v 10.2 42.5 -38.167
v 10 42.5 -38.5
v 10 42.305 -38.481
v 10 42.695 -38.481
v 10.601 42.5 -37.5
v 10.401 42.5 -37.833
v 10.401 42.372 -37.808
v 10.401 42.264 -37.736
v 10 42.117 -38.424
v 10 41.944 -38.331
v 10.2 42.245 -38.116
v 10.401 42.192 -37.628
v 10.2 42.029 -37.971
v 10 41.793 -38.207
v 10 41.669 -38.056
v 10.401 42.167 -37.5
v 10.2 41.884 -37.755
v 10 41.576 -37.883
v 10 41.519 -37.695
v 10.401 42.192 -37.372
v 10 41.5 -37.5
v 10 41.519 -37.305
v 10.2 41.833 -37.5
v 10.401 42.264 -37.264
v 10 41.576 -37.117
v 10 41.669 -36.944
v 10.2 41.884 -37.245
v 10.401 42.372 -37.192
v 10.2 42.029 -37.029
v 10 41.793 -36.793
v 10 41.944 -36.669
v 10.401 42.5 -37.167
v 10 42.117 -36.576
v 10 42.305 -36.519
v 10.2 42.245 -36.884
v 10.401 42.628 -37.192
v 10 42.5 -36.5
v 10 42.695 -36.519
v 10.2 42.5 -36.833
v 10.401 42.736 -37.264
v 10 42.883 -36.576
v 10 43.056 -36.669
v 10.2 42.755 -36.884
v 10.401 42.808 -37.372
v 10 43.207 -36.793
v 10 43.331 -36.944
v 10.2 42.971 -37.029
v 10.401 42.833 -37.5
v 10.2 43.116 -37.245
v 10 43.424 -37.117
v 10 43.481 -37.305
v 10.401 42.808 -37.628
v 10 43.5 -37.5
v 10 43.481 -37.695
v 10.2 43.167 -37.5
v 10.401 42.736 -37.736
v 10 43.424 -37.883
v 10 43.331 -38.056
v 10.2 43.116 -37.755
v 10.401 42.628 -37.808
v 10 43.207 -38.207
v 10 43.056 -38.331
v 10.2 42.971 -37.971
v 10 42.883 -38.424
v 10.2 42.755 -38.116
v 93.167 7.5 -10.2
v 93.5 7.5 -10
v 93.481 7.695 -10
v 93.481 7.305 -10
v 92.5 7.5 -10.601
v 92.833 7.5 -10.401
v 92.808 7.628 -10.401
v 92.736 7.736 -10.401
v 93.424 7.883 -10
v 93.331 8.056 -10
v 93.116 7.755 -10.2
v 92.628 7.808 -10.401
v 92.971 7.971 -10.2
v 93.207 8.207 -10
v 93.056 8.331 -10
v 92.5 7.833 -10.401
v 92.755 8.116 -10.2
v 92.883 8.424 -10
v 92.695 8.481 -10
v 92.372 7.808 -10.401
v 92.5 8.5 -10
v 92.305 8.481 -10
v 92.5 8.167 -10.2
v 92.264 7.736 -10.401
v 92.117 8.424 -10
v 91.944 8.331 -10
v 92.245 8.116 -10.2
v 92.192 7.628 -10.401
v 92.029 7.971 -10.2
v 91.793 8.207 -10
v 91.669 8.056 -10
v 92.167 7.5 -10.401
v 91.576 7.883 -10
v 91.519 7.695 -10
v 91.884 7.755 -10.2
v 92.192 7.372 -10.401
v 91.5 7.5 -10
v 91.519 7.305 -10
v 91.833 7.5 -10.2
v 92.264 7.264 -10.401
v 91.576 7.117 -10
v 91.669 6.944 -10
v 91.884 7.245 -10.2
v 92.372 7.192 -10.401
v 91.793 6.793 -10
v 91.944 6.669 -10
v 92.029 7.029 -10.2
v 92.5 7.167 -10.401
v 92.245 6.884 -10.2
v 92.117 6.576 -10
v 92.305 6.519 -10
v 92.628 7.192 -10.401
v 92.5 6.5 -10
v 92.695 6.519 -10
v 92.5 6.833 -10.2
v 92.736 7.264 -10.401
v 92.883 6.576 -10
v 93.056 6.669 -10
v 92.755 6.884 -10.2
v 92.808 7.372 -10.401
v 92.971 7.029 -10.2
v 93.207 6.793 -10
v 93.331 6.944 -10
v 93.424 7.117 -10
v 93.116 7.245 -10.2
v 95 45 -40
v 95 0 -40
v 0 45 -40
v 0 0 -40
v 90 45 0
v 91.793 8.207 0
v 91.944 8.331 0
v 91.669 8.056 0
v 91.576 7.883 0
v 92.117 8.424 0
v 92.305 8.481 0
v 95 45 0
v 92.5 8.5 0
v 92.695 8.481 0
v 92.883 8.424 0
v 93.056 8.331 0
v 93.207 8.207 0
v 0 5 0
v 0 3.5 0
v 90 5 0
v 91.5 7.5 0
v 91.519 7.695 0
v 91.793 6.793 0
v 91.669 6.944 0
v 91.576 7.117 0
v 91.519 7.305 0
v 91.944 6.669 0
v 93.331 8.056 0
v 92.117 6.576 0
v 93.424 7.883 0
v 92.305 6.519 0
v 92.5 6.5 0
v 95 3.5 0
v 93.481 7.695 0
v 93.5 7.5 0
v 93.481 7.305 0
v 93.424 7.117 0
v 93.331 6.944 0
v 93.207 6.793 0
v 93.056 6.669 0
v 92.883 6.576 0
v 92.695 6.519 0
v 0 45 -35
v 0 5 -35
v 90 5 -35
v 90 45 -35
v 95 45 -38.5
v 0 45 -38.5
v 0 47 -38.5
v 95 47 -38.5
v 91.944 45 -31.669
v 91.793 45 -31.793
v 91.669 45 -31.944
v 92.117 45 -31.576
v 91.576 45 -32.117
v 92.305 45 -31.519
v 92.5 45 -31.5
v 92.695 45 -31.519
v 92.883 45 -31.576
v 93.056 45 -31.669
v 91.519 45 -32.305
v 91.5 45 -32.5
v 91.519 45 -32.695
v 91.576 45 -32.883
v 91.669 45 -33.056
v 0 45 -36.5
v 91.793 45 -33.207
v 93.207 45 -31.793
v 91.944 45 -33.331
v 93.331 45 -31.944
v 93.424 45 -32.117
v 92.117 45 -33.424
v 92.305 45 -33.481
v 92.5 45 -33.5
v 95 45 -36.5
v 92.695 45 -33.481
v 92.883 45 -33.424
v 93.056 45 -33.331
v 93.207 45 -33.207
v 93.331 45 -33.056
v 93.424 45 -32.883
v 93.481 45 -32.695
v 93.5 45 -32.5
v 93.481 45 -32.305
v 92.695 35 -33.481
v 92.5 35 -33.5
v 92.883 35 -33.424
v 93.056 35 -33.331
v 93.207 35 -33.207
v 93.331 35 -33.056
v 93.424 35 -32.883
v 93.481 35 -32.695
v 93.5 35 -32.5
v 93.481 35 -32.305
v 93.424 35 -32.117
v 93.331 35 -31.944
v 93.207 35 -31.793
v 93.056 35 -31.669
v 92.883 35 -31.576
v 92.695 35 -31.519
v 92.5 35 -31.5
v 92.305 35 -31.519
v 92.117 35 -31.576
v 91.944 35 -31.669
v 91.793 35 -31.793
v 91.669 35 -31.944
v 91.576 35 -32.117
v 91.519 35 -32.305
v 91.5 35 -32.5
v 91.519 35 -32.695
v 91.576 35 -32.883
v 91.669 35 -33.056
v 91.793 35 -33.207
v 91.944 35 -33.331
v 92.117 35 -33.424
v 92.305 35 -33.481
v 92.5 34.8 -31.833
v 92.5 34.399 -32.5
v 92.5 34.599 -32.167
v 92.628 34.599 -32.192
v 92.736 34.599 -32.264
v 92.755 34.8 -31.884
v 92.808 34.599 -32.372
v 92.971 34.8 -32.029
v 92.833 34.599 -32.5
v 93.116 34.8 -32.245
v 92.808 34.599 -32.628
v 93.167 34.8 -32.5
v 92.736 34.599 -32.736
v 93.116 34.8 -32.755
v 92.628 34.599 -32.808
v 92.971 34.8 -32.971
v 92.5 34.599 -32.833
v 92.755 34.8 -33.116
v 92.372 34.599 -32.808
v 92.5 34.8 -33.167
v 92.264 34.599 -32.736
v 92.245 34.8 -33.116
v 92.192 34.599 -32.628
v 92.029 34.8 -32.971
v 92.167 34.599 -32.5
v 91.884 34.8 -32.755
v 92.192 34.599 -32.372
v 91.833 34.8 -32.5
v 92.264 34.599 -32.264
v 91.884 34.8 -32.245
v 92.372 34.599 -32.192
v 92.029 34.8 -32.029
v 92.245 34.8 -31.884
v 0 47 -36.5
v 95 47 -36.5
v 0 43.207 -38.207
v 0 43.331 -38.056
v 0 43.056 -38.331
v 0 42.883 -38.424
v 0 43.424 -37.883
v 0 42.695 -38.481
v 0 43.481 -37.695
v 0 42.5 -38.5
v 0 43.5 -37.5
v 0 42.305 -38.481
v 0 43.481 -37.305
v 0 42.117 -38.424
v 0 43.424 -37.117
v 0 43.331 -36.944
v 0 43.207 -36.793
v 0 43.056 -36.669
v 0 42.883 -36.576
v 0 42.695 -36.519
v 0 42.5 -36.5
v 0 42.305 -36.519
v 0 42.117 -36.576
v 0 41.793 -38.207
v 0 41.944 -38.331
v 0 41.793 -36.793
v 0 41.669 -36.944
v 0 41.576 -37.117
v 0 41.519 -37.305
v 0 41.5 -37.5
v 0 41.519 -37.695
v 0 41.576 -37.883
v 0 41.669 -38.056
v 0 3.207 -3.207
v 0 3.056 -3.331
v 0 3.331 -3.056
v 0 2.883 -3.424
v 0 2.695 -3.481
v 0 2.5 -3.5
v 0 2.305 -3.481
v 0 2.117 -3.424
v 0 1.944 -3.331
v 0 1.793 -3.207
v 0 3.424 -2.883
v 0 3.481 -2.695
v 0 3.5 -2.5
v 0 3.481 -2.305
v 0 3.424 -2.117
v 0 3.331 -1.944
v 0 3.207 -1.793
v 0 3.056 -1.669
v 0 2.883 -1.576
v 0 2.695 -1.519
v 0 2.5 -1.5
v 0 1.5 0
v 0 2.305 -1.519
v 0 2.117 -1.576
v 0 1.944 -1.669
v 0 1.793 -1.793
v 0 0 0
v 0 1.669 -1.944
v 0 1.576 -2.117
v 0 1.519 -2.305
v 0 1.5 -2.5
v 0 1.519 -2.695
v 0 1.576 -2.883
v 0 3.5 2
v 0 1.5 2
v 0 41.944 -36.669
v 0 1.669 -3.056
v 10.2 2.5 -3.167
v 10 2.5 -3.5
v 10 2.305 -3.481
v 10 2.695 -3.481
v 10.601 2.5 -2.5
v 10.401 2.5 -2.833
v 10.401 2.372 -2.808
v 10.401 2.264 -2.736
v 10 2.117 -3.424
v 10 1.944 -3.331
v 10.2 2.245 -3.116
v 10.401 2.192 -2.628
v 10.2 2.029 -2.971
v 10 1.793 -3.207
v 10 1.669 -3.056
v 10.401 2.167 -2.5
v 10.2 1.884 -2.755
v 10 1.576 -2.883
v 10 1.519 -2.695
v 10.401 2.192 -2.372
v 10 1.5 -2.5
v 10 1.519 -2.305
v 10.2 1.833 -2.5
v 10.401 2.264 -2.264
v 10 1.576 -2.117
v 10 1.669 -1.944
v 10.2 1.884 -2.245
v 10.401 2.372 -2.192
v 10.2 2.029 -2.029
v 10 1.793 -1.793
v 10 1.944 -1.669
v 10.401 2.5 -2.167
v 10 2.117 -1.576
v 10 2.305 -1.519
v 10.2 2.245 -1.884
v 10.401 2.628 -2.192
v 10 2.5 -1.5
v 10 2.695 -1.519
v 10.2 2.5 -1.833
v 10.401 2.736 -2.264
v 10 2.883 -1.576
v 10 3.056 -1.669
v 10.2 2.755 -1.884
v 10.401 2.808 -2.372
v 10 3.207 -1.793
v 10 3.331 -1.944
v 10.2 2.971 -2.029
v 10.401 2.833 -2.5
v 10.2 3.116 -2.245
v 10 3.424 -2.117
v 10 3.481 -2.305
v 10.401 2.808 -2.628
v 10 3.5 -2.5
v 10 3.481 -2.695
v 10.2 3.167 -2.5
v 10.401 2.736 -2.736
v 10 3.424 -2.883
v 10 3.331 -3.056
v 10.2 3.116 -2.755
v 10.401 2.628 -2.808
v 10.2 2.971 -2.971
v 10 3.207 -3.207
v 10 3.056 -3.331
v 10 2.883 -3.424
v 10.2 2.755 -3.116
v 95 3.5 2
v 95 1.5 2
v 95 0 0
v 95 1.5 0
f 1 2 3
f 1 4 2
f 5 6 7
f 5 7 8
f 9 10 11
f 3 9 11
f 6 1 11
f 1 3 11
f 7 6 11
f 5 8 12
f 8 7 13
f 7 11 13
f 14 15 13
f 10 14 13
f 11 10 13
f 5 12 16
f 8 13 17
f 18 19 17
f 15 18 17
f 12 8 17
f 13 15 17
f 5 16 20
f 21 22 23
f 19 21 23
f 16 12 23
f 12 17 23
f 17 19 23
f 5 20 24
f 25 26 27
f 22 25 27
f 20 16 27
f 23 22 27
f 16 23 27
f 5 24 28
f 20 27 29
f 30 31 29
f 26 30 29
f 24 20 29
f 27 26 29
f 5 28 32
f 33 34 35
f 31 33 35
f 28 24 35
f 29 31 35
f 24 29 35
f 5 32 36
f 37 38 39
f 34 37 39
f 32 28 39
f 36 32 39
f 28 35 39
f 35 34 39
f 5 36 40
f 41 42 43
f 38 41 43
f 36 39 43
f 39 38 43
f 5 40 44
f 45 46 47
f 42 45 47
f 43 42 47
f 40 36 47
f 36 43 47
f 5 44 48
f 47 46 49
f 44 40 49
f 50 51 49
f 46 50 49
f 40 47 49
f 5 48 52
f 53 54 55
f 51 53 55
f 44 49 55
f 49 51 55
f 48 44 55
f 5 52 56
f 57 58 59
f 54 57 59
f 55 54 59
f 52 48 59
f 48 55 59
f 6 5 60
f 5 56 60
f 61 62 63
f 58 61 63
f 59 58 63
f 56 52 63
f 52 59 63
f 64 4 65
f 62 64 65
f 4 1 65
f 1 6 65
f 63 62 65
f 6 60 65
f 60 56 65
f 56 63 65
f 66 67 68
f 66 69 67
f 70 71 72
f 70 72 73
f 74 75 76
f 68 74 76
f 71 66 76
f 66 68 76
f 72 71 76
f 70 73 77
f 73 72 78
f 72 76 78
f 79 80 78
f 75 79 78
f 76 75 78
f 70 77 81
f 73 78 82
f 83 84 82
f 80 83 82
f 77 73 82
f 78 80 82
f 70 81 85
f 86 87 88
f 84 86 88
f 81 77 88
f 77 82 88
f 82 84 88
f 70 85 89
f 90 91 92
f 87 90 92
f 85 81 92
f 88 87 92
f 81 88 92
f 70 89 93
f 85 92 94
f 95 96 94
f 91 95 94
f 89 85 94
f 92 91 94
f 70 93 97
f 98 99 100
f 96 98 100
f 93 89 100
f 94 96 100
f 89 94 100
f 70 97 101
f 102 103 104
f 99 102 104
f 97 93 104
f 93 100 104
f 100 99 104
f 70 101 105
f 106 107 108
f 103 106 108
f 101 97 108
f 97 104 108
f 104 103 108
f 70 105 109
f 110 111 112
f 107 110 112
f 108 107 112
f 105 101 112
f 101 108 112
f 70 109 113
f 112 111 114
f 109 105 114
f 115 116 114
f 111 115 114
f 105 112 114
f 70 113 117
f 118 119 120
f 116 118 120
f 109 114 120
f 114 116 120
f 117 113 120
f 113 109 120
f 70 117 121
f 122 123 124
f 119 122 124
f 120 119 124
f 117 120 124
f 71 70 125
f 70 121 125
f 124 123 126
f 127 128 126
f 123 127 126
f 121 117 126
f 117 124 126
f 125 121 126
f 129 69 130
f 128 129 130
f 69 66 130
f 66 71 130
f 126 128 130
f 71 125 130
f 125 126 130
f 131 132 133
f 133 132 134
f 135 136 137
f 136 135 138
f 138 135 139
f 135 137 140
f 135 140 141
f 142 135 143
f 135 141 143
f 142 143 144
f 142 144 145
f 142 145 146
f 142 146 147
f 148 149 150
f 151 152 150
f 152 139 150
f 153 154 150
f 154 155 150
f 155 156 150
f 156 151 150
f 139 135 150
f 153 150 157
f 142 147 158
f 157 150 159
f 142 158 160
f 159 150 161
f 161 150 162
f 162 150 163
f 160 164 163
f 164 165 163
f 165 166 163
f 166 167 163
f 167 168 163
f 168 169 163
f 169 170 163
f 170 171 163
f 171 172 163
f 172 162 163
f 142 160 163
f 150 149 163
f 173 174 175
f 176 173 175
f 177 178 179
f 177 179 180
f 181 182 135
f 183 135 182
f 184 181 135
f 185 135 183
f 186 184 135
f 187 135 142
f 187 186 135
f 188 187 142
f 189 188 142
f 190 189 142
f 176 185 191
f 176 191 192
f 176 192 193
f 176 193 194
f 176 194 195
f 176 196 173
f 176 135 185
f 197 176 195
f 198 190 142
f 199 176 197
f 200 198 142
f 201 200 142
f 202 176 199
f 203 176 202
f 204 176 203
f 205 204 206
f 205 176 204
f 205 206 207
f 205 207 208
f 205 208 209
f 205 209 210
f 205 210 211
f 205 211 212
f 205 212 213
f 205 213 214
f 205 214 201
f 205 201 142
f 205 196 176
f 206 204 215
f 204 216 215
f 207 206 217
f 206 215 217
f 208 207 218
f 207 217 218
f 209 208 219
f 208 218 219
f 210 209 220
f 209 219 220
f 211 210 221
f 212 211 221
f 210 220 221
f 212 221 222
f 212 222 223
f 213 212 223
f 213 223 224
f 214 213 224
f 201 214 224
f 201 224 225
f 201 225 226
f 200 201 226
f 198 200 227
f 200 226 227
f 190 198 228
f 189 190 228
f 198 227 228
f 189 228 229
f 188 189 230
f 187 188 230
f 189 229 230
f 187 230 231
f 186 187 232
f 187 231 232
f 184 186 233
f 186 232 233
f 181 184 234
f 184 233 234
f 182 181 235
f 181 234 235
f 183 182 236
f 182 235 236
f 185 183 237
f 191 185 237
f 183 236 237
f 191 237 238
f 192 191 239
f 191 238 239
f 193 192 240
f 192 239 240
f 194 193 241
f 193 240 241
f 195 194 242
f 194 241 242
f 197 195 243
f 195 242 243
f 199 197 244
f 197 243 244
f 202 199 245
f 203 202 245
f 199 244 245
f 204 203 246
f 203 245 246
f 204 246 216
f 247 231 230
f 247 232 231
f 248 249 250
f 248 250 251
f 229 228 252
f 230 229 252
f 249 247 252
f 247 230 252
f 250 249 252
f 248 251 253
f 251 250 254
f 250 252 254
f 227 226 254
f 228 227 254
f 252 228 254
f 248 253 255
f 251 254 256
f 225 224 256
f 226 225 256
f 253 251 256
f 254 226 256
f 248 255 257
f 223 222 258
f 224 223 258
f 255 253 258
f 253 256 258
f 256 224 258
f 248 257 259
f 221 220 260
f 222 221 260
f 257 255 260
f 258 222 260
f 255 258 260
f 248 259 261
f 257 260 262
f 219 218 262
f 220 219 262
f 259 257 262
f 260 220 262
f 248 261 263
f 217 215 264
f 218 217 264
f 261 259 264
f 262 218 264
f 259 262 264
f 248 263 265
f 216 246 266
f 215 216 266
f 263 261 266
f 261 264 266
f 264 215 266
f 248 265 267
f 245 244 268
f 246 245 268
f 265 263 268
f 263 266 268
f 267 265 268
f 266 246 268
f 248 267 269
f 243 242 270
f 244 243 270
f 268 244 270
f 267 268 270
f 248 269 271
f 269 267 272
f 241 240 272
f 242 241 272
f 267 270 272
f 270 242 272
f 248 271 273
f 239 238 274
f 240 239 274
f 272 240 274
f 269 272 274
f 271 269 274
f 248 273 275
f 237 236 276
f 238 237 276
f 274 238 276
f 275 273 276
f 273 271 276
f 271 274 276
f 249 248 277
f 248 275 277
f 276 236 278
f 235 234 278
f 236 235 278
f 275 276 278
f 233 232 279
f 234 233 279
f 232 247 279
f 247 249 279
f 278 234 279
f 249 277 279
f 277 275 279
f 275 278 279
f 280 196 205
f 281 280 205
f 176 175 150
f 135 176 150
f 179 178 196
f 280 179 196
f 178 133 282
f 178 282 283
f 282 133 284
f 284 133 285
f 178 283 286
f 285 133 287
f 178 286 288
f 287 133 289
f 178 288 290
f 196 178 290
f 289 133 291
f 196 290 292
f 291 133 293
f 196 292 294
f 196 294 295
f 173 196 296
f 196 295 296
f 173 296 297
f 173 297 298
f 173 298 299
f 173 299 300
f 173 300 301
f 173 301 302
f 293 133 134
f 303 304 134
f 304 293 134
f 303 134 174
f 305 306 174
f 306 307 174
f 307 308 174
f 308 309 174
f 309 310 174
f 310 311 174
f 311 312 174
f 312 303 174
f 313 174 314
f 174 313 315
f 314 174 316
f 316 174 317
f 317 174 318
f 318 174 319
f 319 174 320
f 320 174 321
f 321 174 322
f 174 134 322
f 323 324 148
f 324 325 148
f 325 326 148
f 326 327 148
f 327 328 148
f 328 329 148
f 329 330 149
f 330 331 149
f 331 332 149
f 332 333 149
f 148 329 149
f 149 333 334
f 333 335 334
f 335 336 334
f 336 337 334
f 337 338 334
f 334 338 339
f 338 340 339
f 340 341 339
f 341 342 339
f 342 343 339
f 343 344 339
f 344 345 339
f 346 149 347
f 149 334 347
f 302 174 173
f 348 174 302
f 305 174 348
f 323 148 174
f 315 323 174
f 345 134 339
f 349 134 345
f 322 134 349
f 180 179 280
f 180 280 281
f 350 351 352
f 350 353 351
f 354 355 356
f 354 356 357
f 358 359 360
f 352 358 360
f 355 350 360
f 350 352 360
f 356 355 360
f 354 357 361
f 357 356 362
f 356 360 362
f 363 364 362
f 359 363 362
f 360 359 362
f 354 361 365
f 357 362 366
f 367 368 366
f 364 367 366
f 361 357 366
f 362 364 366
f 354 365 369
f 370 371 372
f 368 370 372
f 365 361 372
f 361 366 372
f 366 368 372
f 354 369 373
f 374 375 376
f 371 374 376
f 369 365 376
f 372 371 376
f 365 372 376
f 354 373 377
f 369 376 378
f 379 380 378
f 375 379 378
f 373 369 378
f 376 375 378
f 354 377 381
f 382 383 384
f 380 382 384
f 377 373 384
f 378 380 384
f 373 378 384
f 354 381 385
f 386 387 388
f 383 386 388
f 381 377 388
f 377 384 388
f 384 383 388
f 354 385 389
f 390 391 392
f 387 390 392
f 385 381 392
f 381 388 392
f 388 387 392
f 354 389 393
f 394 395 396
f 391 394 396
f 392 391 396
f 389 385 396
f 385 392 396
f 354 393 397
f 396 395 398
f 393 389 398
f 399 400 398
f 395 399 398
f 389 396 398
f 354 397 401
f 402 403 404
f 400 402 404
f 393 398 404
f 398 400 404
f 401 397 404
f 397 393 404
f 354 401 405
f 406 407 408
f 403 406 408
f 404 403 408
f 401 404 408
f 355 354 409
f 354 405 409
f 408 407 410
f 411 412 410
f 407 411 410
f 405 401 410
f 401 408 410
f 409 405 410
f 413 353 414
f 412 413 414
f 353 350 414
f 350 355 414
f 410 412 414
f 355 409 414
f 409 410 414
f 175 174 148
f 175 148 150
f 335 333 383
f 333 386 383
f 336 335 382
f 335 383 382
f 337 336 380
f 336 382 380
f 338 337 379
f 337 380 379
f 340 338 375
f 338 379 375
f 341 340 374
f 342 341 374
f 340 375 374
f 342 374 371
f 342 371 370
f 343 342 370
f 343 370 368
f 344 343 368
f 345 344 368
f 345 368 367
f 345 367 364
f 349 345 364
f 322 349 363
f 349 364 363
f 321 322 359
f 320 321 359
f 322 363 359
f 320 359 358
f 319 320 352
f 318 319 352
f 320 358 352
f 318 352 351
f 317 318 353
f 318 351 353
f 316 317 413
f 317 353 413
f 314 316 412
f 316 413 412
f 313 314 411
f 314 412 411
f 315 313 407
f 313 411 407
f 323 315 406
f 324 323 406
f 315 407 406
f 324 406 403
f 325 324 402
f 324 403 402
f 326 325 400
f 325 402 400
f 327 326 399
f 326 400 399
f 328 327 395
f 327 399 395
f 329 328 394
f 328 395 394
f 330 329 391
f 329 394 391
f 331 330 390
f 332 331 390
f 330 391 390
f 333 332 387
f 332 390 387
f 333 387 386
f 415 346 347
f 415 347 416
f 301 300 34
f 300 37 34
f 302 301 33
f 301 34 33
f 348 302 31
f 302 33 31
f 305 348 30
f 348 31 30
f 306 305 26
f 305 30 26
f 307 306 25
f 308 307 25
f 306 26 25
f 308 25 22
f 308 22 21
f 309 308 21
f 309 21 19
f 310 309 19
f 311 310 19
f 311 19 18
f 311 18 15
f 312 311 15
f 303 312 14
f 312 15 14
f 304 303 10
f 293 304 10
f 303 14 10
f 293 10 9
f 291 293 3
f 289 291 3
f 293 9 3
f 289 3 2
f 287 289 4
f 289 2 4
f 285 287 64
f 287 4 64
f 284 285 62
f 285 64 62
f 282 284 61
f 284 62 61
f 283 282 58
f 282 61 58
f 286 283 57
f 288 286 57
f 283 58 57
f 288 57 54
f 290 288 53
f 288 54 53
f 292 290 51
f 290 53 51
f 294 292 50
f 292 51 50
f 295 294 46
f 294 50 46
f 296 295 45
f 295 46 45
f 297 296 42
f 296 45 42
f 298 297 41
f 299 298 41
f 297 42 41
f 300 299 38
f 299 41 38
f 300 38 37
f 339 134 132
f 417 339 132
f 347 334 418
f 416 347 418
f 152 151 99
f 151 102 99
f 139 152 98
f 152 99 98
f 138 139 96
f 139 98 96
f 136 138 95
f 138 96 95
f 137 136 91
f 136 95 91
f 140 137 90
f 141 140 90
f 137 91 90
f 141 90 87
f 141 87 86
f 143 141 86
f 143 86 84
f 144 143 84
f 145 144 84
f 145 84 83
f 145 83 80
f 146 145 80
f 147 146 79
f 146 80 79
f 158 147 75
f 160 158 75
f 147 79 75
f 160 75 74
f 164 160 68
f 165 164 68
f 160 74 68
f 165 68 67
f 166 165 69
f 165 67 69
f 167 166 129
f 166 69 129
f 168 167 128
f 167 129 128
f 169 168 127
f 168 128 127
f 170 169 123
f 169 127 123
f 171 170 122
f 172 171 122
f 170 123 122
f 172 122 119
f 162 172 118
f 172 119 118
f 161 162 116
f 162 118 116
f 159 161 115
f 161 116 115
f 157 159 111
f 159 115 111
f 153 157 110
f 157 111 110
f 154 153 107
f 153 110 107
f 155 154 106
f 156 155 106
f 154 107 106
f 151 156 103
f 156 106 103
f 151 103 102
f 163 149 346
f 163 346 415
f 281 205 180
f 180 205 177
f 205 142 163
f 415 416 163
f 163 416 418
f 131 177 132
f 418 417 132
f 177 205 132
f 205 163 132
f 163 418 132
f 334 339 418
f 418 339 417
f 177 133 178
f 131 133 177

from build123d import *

# Parameters (mm, degrees)
CROQUIS1_W                                  = 95
CROQUIS1_H                                  = 40
SALIENTE_EXTRUIR1_DEPTH                     = 5
SALIENTE_EXTRUIR2_DEPTH                     = 40
CROQUIS3_W                                  = 95
CROQUIS3_H                                  = 2
SALIENTE_EXTRUIR3_DEPTH                     = 2
CROQUIS4_W                                  = 95
CROQUIS4_H                                  = 2
SALIENTE_EXTRUIR4_DEPTH                     = 2
DI_METRO_DE_TALADRO_2_0_2_1_D               = 2
DI_METRO_DE_TALADRO_2_0_2_1_DEPTH           = 10
DI_METRO_DE_TALADRO_2_0_2_1_TIP             = 0.600860619
DI_METRO_DE_TALADRO_2_0_2_2_D               = 2
DI_METRO_DE_TALADRO_2_0_2_2_DEPTH           = 10
DI_METRO_DE_TALADRO_2_0_2_2_TIP             = 0.600860619
DI_METRO_DE_TALADRO_2_0_2_2_ON_FACE_2_D     = 2
DI_METRO_DE_TALADRO_2_0_2_2_ON_FACE_2_DEPTH = 10
DI_METRO_DE_TALADRO_2_0_2_2_ON_FACE_2_TIP   = 0.600860619


with BuildPart() as part:
    # Croquis1 → Saliente-Extruir1 (new body)
    with BuildSketch(Plane(origin=(0, 0, 0), x_dir=(1, 0, 0), z_dir=(0, 1, 0))):
        with Locations((47.5, 20)):
            Rectangle(CROQUIS1_W, CROQUIS1_H)
    extrude(amount=SALIENTE_EXTRUIR1_DEPTH)

    # Croquis2 → Saliente-Extruir2 (add)
    with BuildSketch(Plane(origin=(0, 5, 0), x_dir=(1, 0, 0), z_dir=(0, 1, 0))):
        Polygon((0, 35), (90, 35), (90, 0), (95, 0), (95, 40), (0, 40), align=None)
    extrude(amount=SALIENTE_EXTRUIR2_DEPTH)

    # Croquis3 → Saliente-Extruir3 (add)
    with BuildSketch(Plane(origin=(0, 45, 0), x_dir=(1, 0, 0), z_dir=(0, 1, 0))):
        with Locations((47.5, 37.5)):
            Rectangle(CROQUIS3_W, CROQUIS3_H)
    extrude(amount=SALIENTE_EXTRUIR3_DEPTH)

    # Croquis4 → Saliente-Extruir4 (add)
    with BuildSketch(Plane.XY):
        with Locations((47.5, 2.5)):
            Rectangle(CROQUIS4_W, CROQUIS4_H)
    extrude(amount=SALIENTE_EXTRUIR4_DEPTH)

    # Diámetro de taladro Ø2.0 (2)1
    with Locations(Plane(origin=(0, 42.5, -37.5), x_dir=(0, 0, -1), z_dir=(-1, 0, 0))):
        with Locations((0, 0), (-35, 40)):
            Hole(DI_METRO_DE_TALADRO_2_0_2_1_D / 2, depth=DI_METRO_DE_TALADRO_2_0_2_1_DEPTH)
            with Locations((0, 0, -(DI_METRO_DE_TALADRO_2_0_2_1_DEPTH + DI_METRO_DE_TALADRO_2_0_2_1_TIP / 2))):  # 118° drill point
                Cone(0, DI_METRO_DE_TALADRO_2_0_2_1_D / 2, DI_METRO_DE_TALADRO_2_0_2_1_TIP, mode=Mode.SUBTRACT)

    # Diámetro de taladro Ø2.0 (2)2
    with Locations(Plane(origin=(92.5, 45, -32.5), x_dir=(0, 0, 1), z_dir=(0, 1, 0))):
        with Locations((0, 0)):
            Hole(DI_METRO_DE_TALADRO_2_0_2_2_D / 2, depth=DI_METRO_DE_TALADRO_2_0_2_2_DEPTH)
            with Locations((0, 0, -(DI_METRO_DE_TALADRO_2_0_2_2_DEPTH + DI_METRO_DE_TALADRO_2_0_2_2_TIP / 2))):  # 118° drill point
                Cone(0, DI_METRO_DE_TALADRO_2_0_2_2_D / 2, DI_METRO_DE_TALADRO_2_0_2_2_TIP, mode=Mode.SUBTRACT)

    # Diámetro de taladro Ø2.0 (2)2 on face 2
    with Locations(Plane(origin=(92.5, 7.5, 0), x_dir=(1, 0, 0), z_dir=(0, 0, 1))):
        with Locations((0, 0)):
            Hole(DI_METRO_DE_TALADRO_2_0_2_2_ON_FACE_2_D / 2, depth=DI_METRO_DE_TALADRO_2_0_2_2_ON_FACE_2_DEPTH)
            with Locations((0, 0, -(DI_METRO_DE_TALADRO_2_0_2_2_ON_FACE_2_DEPTH + DI_METRO_DE_TALADRO_2_0_2_2_ON_FACE_2_TIP / 2))):  # 118° drill point
                Cone(0, DI_METRO_DE_TALADRO_2_0_2_2_ON_FACE_2_D / 2, DI_METRO_DE_TALADRO_2_0_2_2_ON_FACE_2_TIP, mode=Mode.SUBTRACT)


solid = part.part
